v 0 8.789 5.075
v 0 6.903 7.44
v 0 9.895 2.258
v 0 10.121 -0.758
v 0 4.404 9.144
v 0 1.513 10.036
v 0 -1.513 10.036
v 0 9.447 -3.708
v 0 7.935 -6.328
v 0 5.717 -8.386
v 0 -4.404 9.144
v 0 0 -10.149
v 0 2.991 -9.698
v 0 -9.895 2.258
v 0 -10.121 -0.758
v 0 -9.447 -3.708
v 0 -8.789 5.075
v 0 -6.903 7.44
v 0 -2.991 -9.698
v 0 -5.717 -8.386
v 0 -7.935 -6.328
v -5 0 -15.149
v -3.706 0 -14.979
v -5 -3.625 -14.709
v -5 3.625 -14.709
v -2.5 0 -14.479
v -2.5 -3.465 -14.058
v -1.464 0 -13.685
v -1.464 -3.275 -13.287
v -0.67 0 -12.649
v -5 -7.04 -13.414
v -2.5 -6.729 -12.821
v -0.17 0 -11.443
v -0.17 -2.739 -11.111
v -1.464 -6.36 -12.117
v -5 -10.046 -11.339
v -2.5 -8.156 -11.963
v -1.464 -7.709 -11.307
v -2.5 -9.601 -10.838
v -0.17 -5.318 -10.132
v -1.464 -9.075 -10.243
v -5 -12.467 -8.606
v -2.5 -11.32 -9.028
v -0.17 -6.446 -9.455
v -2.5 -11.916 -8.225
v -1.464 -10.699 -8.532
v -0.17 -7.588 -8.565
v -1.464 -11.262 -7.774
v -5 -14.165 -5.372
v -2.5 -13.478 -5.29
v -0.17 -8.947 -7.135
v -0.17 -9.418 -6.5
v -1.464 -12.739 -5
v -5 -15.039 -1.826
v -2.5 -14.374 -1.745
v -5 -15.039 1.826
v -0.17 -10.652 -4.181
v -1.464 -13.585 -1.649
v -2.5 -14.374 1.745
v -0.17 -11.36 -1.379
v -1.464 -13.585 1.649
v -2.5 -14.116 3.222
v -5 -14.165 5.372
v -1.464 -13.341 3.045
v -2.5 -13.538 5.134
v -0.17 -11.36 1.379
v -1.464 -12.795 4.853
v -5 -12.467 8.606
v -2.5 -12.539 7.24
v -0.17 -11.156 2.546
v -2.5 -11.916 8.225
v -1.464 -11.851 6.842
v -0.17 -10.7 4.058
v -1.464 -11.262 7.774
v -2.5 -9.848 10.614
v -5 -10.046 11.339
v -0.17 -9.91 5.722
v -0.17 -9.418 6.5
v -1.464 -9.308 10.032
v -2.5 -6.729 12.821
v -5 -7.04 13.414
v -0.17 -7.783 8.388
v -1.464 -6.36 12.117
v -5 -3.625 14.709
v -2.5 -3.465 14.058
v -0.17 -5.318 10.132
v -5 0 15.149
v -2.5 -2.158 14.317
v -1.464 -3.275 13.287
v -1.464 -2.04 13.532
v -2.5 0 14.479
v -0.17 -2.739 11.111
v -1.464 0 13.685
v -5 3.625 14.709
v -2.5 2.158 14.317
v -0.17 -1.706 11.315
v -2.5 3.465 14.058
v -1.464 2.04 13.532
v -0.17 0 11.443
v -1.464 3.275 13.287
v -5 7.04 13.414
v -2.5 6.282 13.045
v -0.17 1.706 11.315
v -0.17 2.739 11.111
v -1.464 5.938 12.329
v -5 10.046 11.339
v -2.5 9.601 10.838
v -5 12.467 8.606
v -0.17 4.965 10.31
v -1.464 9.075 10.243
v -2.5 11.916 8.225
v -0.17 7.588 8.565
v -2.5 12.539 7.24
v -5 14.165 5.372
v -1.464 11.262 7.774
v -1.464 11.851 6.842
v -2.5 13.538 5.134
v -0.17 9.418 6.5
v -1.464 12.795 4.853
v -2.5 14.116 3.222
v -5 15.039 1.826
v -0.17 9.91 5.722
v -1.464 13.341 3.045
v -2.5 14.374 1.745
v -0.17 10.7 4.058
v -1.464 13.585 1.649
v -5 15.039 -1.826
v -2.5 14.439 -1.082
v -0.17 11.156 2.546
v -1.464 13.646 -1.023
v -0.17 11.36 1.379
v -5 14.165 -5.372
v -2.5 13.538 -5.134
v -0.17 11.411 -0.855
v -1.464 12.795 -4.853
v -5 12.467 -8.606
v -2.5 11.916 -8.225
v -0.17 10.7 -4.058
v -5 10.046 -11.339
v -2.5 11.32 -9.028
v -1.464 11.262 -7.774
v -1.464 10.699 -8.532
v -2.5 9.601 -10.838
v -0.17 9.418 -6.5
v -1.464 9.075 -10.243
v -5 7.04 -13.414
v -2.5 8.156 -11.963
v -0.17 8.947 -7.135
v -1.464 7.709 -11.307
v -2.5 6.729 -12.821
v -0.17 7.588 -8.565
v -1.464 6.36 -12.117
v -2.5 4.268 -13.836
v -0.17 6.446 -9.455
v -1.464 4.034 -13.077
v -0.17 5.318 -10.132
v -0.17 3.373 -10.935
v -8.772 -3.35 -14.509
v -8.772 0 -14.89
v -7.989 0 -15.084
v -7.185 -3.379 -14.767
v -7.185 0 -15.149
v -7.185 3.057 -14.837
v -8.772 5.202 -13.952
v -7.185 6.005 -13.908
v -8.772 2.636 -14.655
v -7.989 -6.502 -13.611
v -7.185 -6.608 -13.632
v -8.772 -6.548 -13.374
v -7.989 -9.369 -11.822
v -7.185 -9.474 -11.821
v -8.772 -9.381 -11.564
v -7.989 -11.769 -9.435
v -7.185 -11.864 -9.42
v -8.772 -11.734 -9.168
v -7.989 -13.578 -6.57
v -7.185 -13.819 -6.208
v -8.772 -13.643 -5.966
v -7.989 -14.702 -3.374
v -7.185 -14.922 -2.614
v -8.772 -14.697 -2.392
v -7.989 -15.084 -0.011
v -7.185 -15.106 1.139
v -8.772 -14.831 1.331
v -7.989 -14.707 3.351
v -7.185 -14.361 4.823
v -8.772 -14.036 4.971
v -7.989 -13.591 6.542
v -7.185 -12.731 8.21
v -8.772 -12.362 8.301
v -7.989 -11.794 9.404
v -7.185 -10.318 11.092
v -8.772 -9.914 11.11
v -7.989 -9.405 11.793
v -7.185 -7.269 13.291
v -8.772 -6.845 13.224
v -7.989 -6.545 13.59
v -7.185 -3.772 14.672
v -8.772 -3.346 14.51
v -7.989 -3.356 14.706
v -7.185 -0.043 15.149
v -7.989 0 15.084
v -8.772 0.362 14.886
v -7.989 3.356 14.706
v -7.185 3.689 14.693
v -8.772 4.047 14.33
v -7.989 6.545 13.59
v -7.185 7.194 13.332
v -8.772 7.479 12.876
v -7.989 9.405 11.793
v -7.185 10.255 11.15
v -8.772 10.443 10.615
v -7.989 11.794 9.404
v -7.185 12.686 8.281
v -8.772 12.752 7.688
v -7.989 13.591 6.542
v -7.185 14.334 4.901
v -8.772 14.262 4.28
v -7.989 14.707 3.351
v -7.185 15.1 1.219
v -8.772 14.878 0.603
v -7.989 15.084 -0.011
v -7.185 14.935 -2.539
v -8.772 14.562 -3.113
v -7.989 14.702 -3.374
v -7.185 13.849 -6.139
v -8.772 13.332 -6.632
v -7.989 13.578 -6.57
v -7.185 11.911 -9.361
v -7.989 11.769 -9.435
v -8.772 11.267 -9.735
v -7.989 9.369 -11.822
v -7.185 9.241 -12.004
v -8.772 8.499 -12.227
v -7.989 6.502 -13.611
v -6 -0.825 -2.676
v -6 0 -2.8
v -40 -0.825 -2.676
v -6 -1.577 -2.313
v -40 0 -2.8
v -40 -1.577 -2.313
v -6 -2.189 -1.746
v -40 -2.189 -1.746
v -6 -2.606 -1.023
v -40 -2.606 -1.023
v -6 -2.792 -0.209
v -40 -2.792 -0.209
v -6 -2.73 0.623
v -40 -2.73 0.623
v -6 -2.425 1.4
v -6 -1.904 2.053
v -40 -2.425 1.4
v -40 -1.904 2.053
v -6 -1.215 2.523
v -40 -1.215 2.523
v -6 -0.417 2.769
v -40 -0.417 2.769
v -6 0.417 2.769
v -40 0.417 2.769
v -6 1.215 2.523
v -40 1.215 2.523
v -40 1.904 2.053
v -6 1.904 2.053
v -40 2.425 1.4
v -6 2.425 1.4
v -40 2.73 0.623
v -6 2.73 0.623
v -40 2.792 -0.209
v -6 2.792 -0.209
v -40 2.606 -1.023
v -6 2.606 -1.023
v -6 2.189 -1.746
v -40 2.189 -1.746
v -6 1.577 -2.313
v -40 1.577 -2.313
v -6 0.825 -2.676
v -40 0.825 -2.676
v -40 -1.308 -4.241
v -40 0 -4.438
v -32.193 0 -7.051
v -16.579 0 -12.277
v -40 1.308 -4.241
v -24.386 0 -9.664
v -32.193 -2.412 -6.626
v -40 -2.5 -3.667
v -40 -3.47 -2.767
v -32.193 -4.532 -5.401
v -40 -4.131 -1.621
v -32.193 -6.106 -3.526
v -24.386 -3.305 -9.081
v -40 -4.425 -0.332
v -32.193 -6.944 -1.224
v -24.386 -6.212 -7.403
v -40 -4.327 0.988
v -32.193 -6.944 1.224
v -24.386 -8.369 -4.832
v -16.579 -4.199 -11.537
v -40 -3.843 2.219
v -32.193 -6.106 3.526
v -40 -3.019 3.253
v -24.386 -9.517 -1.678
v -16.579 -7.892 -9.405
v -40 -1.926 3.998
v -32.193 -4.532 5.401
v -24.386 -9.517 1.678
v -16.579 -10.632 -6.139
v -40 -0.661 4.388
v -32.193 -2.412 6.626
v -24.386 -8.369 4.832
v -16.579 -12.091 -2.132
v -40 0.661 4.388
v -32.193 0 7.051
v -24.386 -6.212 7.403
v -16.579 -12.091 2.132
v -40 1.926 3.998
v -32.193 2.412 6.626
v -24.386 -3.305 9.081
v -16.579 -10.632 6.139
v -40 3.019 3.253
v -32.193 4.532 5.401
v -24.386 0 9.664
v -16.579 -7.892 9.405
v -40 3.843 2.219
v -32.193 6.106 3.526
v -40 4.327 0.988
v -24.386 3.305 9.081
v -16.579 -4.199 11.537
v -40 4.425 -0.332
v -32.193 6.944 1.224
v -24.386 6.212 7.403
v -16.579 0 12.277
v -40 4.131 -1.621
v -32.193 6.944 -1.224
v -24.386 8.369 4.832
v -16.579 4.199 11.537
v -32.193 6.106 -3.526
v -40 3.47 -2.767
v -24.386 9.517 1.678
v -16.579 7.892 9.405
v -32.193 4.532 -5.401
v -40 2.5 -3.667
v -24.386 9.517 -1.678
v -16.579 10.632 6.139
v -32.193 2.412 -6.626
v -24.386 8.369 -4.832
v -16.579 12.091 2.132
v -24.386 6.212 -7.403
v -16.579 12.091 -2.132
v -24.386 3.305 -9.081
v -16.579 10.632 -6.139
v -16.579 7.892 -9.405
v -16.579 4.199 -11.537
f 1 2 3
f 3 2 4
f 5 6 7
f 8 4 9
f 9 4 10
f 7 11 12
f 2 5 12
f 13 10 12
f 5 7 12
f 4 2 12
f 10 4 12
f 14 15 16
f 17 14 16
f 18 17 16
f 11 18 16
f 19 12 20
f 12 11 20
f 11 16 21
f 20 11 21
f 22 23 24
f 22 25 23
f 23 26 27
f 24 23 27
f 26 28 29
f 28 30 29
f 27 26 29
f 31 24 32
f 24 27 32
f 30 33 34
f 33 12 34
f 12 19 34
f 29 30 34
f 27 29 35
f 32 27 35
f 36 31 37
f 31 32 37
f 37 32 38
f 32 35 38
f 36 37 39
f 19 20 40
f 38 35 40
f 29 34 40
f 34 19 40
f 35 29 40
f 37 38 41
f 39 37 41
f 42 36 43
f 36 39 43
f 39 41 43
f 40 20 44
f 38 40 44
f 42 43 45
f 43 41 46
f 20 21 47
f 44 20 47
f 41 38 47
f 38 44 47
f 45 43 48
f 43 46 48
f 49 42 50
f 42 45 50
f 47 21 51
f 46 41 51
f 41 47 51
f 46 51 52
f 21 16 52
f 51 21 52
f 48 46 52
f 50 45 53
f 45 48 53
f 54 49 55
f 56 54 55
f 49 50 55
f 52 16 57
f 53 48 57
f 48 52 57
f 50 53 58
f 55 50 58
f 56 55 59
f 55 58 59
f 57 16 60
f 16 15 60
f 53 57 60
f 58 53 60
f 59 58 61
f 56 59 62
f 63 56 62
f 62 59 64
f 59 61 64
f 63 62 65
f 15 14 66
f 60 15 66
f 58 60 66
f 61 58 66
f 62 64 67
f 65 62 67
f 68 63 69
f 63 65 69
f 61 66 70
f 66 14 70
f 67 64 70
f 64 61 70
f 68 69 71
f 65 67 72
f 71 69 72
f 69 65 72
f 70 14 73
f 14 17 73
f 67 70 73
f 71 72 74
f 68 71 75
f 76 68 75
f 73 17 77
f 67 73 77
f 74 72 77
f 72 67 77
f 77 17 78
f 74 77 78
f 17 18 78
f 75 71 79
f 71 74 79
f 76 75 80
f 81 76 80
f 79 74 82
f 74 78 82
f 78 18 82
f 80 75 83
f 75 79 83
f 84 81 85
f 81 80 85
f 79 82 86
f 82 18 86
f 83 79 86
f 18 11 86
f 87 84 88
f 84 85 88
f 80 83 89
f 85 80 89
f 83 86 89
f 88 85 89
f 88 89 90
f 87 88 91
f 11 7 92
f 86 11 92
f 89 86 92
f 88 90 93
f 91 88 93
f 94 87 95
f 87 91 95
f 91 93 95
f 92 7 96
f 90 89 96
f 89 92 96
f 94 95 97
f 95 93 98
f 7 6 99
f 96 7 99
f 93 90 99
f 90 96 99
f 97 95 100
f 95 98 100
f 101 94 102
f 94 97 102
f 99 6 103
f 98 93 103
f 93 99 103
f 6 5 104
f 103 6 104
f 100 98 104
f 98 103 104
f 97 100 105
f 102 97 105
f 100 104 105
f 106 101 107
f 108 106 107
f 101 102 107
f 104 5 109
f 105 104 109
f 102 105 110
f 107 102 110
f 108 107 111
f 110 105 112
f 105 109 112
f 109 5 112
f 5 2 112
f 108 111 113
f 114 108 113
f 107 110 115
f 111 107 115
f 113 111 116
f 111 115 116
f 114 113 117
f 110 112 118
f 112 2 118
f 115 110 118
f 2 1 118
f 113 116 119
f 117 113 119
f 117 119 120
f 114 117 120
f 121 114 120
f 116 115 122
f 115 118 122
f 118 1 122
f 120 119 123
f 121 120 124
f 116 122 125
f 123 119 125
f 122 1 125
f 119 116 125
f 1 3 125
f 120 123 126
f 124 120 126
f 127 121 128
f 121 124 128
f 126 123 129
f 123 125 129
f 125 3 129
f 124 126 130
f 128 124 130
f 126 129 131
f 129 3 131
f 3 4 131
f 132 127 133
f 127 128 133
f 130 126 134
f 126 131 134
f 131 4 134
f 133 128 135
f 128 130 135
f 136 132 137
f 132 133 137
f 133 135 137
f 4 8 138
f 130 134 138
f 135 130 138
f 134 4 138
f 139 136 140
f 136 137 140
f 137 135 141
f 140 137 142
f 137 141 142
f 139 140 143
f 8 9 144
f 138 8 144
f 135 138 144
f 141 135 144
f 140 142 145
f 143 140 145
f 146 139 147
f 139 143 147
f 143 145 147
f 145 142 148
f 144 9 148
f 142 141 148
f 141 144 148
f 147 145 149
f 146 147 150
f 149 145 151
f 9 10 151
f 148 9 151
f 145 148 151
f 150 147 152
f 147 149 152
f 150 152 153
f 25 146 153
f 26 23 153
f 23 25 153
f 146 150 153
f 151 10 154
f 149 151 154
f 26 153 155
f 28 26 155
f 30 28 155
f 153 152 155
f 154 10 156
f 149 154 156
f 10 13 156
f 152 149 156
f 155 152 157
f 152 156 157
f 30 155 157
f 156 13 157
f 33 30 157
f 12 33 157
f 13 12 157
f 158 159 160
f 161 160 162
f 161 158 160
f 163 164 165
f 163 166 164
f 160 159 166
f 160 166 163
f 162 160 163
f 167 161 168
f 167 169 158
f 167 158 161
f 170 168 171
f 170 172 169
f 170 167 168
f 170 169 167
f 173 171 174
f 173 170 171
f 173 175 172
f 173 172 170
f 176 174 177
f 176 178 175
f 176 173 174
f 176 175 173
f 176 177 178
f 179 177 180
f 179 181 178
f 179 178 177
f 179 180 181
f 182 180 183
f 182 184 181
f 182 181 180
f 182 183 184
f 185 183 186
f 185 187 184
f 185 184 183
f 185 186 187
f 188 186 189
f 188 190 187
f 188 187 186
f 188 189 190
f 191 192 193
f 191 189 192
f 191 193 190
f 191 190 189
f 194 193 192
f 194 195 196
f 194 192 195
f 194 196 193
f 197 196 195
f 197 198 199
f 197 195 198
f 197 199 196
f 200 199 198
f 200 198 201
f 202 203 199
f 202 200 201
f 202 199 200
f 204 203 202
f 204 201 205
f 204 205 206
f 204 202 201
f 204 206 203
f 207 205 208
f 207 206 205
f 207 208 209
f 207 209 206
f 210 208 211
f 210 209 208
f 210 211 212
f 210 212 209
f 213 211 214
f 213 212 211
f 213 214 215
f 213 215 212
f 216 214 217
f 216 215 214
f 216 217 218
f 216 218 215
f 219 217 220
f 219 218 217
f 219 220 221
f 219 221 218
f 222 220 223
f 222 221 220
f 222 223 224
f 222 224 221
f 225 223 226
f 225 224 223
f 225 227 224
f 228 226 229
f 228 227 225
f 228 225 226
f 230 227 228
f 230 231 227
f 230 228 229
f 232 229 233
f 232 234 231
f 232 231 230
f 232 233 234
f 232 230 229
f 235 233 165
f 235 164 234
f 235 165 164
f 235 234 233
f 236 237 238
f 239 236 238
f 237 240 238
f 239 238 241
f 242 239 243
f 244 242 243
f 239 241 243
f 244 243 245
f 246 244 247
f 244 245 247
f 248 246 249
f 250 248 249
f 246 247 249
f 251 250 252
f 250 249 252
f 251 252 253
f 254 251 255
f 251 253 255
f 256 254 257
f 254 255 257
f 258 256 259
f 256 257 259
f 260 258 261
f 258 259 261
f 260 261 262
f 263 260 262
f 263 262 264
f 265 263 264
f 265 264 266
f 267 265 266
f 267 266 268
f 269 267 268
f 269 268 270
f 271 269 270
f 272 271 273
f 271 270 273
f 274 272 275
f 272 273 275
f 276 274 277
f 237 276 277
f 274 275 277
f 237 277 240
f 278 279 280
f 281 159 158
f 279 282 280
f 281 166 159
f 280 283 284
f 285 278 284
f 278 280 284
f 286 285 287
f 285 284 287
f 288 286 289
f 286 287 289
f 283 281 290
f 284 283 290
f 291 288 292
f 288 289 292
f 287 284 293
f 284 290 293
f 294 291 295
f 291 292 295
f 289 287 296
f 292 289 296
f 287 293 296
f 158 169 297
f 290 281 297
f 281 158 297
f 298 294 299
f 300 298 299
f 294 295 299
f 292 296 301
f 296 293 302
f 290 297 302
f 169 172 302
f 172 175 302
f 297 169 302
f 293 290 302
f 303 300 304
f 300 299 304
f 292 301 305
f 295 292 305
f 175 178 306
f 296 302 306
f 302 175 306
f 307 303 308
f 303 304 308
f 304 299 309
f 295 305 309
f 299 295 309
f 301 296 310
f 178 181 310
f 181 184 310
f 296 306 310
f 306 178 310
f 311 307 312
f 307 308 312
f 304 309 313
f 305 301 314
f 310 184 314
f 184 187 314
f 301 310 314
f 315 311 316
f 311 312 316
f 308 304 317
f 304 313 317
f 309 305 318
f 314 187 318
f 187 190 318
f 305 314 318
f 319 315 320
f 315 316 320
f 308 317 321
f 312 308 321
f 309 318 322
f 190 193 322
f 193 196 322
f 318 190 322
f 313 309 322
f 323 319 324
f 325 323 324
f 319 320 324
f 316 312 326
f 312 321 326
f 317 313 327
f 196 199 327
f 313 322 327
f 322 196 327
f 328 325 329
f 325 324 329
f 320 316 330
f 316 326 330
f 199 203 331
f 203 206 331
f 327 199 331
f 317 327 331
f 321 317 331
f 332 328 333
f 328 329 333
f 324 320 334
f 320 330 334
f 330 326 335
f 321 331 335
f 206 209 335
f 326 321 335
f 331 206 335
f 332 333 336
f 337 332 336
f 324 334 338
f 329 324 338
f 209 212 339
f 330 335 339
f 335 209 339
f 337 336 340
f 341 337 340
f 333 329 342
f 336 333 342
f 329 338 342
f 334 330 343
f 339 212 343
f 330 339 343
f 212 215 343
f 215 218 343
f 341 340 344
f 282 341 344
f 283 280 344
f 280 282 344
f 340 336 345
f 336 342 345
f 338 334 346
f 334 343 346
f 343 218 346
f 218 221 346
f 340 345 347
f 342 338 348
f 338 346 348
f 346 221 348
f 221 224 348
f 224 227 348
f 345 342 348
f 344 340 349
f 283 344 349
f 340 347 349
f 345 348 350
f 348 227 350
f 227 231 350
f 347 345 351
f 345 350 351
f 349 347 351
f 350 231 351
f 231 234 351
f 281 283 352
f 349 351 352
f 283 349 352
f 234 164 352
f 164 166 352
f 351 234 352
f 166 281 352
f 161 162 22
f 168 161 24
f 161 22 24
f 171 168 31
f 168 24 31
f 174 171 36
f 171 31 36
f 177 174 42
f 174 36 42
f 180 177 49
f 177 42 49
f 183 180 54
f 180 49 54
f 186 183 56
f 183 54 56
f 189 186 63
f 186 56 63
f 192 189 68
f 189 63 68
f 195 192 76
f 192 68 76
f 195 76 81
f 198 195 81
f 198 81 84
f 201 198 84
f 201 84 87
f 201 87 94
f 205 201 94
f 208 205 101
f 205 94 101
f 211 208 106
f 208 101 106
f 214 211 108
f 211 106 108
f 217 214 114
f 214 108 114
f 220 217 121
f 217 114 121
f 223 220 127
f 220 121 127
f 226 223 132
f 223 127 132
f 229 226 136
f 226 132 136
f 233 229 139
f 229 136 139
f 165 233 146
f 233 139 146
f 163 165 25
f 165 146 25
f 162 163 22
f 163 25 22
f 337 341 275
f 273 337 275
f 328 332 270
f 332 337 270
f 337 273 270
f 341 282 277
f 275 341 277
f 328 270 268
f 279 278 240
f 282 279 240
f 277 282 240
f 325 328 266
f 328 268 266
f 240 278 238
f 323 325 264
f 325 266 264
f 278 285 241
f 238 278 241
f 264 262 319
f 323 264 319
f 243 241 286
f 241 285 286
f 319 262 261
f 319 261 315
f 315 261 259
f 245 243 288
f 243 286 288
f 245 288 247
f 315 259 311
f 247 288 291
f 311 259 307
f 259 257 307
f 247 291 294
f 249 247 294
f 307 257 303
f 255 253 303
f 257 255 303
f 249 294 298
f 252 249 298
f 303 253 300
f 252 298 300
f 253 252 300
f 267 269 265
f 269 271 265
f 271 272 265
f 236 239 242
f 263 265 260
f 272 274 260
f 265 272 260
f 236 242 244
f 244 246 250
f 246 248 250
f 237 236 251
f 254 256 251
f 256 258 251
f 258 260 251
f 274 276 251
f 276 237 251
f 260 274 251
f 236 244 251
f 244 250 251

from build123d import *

# Parameters (mm, degrees)
FILLET1_R = 5
FILLET2_R = 5


with BuildPart() as part:
    # Sketch1 → Revolve1 (revolve)
    with BuildSketch(Plane(origin=(0, 0, 0), x_dir=(0, 1, 0), z_dir=(0, 0, 1)), mode=Mode.PRIVATE) as revolve1_sk:
        Polygon((0, 0), (0, 6), (2.8, 6), (2.8, 40), (4.437898451, 40), (15.149054344, 8), (15.149054344, 0), align=None)
    revolve(revolve1_sk.sketch.rotate(Axis((0, 0, 0), (-1, 0, 0)), 90), axis=Axis((0, 0, 0), (-1, 0, 0)))

    # Fillet1
    fillet1_edges = [part.edges().sort_by_distance(p)[0] for p in [
        (-8, 0, 15.149054344),
    ]]
    fillet(fillet1_edges, radius=FILLET1_R)

    # Fillet2
    fillet2_edges = [part.edges().sort_by_distance(p)[0] for p in [
        (0, 0, 15.149054344),
    ]]
    fillet(fillet2_edges, radius=FILLET2_R)


solid = part.part
